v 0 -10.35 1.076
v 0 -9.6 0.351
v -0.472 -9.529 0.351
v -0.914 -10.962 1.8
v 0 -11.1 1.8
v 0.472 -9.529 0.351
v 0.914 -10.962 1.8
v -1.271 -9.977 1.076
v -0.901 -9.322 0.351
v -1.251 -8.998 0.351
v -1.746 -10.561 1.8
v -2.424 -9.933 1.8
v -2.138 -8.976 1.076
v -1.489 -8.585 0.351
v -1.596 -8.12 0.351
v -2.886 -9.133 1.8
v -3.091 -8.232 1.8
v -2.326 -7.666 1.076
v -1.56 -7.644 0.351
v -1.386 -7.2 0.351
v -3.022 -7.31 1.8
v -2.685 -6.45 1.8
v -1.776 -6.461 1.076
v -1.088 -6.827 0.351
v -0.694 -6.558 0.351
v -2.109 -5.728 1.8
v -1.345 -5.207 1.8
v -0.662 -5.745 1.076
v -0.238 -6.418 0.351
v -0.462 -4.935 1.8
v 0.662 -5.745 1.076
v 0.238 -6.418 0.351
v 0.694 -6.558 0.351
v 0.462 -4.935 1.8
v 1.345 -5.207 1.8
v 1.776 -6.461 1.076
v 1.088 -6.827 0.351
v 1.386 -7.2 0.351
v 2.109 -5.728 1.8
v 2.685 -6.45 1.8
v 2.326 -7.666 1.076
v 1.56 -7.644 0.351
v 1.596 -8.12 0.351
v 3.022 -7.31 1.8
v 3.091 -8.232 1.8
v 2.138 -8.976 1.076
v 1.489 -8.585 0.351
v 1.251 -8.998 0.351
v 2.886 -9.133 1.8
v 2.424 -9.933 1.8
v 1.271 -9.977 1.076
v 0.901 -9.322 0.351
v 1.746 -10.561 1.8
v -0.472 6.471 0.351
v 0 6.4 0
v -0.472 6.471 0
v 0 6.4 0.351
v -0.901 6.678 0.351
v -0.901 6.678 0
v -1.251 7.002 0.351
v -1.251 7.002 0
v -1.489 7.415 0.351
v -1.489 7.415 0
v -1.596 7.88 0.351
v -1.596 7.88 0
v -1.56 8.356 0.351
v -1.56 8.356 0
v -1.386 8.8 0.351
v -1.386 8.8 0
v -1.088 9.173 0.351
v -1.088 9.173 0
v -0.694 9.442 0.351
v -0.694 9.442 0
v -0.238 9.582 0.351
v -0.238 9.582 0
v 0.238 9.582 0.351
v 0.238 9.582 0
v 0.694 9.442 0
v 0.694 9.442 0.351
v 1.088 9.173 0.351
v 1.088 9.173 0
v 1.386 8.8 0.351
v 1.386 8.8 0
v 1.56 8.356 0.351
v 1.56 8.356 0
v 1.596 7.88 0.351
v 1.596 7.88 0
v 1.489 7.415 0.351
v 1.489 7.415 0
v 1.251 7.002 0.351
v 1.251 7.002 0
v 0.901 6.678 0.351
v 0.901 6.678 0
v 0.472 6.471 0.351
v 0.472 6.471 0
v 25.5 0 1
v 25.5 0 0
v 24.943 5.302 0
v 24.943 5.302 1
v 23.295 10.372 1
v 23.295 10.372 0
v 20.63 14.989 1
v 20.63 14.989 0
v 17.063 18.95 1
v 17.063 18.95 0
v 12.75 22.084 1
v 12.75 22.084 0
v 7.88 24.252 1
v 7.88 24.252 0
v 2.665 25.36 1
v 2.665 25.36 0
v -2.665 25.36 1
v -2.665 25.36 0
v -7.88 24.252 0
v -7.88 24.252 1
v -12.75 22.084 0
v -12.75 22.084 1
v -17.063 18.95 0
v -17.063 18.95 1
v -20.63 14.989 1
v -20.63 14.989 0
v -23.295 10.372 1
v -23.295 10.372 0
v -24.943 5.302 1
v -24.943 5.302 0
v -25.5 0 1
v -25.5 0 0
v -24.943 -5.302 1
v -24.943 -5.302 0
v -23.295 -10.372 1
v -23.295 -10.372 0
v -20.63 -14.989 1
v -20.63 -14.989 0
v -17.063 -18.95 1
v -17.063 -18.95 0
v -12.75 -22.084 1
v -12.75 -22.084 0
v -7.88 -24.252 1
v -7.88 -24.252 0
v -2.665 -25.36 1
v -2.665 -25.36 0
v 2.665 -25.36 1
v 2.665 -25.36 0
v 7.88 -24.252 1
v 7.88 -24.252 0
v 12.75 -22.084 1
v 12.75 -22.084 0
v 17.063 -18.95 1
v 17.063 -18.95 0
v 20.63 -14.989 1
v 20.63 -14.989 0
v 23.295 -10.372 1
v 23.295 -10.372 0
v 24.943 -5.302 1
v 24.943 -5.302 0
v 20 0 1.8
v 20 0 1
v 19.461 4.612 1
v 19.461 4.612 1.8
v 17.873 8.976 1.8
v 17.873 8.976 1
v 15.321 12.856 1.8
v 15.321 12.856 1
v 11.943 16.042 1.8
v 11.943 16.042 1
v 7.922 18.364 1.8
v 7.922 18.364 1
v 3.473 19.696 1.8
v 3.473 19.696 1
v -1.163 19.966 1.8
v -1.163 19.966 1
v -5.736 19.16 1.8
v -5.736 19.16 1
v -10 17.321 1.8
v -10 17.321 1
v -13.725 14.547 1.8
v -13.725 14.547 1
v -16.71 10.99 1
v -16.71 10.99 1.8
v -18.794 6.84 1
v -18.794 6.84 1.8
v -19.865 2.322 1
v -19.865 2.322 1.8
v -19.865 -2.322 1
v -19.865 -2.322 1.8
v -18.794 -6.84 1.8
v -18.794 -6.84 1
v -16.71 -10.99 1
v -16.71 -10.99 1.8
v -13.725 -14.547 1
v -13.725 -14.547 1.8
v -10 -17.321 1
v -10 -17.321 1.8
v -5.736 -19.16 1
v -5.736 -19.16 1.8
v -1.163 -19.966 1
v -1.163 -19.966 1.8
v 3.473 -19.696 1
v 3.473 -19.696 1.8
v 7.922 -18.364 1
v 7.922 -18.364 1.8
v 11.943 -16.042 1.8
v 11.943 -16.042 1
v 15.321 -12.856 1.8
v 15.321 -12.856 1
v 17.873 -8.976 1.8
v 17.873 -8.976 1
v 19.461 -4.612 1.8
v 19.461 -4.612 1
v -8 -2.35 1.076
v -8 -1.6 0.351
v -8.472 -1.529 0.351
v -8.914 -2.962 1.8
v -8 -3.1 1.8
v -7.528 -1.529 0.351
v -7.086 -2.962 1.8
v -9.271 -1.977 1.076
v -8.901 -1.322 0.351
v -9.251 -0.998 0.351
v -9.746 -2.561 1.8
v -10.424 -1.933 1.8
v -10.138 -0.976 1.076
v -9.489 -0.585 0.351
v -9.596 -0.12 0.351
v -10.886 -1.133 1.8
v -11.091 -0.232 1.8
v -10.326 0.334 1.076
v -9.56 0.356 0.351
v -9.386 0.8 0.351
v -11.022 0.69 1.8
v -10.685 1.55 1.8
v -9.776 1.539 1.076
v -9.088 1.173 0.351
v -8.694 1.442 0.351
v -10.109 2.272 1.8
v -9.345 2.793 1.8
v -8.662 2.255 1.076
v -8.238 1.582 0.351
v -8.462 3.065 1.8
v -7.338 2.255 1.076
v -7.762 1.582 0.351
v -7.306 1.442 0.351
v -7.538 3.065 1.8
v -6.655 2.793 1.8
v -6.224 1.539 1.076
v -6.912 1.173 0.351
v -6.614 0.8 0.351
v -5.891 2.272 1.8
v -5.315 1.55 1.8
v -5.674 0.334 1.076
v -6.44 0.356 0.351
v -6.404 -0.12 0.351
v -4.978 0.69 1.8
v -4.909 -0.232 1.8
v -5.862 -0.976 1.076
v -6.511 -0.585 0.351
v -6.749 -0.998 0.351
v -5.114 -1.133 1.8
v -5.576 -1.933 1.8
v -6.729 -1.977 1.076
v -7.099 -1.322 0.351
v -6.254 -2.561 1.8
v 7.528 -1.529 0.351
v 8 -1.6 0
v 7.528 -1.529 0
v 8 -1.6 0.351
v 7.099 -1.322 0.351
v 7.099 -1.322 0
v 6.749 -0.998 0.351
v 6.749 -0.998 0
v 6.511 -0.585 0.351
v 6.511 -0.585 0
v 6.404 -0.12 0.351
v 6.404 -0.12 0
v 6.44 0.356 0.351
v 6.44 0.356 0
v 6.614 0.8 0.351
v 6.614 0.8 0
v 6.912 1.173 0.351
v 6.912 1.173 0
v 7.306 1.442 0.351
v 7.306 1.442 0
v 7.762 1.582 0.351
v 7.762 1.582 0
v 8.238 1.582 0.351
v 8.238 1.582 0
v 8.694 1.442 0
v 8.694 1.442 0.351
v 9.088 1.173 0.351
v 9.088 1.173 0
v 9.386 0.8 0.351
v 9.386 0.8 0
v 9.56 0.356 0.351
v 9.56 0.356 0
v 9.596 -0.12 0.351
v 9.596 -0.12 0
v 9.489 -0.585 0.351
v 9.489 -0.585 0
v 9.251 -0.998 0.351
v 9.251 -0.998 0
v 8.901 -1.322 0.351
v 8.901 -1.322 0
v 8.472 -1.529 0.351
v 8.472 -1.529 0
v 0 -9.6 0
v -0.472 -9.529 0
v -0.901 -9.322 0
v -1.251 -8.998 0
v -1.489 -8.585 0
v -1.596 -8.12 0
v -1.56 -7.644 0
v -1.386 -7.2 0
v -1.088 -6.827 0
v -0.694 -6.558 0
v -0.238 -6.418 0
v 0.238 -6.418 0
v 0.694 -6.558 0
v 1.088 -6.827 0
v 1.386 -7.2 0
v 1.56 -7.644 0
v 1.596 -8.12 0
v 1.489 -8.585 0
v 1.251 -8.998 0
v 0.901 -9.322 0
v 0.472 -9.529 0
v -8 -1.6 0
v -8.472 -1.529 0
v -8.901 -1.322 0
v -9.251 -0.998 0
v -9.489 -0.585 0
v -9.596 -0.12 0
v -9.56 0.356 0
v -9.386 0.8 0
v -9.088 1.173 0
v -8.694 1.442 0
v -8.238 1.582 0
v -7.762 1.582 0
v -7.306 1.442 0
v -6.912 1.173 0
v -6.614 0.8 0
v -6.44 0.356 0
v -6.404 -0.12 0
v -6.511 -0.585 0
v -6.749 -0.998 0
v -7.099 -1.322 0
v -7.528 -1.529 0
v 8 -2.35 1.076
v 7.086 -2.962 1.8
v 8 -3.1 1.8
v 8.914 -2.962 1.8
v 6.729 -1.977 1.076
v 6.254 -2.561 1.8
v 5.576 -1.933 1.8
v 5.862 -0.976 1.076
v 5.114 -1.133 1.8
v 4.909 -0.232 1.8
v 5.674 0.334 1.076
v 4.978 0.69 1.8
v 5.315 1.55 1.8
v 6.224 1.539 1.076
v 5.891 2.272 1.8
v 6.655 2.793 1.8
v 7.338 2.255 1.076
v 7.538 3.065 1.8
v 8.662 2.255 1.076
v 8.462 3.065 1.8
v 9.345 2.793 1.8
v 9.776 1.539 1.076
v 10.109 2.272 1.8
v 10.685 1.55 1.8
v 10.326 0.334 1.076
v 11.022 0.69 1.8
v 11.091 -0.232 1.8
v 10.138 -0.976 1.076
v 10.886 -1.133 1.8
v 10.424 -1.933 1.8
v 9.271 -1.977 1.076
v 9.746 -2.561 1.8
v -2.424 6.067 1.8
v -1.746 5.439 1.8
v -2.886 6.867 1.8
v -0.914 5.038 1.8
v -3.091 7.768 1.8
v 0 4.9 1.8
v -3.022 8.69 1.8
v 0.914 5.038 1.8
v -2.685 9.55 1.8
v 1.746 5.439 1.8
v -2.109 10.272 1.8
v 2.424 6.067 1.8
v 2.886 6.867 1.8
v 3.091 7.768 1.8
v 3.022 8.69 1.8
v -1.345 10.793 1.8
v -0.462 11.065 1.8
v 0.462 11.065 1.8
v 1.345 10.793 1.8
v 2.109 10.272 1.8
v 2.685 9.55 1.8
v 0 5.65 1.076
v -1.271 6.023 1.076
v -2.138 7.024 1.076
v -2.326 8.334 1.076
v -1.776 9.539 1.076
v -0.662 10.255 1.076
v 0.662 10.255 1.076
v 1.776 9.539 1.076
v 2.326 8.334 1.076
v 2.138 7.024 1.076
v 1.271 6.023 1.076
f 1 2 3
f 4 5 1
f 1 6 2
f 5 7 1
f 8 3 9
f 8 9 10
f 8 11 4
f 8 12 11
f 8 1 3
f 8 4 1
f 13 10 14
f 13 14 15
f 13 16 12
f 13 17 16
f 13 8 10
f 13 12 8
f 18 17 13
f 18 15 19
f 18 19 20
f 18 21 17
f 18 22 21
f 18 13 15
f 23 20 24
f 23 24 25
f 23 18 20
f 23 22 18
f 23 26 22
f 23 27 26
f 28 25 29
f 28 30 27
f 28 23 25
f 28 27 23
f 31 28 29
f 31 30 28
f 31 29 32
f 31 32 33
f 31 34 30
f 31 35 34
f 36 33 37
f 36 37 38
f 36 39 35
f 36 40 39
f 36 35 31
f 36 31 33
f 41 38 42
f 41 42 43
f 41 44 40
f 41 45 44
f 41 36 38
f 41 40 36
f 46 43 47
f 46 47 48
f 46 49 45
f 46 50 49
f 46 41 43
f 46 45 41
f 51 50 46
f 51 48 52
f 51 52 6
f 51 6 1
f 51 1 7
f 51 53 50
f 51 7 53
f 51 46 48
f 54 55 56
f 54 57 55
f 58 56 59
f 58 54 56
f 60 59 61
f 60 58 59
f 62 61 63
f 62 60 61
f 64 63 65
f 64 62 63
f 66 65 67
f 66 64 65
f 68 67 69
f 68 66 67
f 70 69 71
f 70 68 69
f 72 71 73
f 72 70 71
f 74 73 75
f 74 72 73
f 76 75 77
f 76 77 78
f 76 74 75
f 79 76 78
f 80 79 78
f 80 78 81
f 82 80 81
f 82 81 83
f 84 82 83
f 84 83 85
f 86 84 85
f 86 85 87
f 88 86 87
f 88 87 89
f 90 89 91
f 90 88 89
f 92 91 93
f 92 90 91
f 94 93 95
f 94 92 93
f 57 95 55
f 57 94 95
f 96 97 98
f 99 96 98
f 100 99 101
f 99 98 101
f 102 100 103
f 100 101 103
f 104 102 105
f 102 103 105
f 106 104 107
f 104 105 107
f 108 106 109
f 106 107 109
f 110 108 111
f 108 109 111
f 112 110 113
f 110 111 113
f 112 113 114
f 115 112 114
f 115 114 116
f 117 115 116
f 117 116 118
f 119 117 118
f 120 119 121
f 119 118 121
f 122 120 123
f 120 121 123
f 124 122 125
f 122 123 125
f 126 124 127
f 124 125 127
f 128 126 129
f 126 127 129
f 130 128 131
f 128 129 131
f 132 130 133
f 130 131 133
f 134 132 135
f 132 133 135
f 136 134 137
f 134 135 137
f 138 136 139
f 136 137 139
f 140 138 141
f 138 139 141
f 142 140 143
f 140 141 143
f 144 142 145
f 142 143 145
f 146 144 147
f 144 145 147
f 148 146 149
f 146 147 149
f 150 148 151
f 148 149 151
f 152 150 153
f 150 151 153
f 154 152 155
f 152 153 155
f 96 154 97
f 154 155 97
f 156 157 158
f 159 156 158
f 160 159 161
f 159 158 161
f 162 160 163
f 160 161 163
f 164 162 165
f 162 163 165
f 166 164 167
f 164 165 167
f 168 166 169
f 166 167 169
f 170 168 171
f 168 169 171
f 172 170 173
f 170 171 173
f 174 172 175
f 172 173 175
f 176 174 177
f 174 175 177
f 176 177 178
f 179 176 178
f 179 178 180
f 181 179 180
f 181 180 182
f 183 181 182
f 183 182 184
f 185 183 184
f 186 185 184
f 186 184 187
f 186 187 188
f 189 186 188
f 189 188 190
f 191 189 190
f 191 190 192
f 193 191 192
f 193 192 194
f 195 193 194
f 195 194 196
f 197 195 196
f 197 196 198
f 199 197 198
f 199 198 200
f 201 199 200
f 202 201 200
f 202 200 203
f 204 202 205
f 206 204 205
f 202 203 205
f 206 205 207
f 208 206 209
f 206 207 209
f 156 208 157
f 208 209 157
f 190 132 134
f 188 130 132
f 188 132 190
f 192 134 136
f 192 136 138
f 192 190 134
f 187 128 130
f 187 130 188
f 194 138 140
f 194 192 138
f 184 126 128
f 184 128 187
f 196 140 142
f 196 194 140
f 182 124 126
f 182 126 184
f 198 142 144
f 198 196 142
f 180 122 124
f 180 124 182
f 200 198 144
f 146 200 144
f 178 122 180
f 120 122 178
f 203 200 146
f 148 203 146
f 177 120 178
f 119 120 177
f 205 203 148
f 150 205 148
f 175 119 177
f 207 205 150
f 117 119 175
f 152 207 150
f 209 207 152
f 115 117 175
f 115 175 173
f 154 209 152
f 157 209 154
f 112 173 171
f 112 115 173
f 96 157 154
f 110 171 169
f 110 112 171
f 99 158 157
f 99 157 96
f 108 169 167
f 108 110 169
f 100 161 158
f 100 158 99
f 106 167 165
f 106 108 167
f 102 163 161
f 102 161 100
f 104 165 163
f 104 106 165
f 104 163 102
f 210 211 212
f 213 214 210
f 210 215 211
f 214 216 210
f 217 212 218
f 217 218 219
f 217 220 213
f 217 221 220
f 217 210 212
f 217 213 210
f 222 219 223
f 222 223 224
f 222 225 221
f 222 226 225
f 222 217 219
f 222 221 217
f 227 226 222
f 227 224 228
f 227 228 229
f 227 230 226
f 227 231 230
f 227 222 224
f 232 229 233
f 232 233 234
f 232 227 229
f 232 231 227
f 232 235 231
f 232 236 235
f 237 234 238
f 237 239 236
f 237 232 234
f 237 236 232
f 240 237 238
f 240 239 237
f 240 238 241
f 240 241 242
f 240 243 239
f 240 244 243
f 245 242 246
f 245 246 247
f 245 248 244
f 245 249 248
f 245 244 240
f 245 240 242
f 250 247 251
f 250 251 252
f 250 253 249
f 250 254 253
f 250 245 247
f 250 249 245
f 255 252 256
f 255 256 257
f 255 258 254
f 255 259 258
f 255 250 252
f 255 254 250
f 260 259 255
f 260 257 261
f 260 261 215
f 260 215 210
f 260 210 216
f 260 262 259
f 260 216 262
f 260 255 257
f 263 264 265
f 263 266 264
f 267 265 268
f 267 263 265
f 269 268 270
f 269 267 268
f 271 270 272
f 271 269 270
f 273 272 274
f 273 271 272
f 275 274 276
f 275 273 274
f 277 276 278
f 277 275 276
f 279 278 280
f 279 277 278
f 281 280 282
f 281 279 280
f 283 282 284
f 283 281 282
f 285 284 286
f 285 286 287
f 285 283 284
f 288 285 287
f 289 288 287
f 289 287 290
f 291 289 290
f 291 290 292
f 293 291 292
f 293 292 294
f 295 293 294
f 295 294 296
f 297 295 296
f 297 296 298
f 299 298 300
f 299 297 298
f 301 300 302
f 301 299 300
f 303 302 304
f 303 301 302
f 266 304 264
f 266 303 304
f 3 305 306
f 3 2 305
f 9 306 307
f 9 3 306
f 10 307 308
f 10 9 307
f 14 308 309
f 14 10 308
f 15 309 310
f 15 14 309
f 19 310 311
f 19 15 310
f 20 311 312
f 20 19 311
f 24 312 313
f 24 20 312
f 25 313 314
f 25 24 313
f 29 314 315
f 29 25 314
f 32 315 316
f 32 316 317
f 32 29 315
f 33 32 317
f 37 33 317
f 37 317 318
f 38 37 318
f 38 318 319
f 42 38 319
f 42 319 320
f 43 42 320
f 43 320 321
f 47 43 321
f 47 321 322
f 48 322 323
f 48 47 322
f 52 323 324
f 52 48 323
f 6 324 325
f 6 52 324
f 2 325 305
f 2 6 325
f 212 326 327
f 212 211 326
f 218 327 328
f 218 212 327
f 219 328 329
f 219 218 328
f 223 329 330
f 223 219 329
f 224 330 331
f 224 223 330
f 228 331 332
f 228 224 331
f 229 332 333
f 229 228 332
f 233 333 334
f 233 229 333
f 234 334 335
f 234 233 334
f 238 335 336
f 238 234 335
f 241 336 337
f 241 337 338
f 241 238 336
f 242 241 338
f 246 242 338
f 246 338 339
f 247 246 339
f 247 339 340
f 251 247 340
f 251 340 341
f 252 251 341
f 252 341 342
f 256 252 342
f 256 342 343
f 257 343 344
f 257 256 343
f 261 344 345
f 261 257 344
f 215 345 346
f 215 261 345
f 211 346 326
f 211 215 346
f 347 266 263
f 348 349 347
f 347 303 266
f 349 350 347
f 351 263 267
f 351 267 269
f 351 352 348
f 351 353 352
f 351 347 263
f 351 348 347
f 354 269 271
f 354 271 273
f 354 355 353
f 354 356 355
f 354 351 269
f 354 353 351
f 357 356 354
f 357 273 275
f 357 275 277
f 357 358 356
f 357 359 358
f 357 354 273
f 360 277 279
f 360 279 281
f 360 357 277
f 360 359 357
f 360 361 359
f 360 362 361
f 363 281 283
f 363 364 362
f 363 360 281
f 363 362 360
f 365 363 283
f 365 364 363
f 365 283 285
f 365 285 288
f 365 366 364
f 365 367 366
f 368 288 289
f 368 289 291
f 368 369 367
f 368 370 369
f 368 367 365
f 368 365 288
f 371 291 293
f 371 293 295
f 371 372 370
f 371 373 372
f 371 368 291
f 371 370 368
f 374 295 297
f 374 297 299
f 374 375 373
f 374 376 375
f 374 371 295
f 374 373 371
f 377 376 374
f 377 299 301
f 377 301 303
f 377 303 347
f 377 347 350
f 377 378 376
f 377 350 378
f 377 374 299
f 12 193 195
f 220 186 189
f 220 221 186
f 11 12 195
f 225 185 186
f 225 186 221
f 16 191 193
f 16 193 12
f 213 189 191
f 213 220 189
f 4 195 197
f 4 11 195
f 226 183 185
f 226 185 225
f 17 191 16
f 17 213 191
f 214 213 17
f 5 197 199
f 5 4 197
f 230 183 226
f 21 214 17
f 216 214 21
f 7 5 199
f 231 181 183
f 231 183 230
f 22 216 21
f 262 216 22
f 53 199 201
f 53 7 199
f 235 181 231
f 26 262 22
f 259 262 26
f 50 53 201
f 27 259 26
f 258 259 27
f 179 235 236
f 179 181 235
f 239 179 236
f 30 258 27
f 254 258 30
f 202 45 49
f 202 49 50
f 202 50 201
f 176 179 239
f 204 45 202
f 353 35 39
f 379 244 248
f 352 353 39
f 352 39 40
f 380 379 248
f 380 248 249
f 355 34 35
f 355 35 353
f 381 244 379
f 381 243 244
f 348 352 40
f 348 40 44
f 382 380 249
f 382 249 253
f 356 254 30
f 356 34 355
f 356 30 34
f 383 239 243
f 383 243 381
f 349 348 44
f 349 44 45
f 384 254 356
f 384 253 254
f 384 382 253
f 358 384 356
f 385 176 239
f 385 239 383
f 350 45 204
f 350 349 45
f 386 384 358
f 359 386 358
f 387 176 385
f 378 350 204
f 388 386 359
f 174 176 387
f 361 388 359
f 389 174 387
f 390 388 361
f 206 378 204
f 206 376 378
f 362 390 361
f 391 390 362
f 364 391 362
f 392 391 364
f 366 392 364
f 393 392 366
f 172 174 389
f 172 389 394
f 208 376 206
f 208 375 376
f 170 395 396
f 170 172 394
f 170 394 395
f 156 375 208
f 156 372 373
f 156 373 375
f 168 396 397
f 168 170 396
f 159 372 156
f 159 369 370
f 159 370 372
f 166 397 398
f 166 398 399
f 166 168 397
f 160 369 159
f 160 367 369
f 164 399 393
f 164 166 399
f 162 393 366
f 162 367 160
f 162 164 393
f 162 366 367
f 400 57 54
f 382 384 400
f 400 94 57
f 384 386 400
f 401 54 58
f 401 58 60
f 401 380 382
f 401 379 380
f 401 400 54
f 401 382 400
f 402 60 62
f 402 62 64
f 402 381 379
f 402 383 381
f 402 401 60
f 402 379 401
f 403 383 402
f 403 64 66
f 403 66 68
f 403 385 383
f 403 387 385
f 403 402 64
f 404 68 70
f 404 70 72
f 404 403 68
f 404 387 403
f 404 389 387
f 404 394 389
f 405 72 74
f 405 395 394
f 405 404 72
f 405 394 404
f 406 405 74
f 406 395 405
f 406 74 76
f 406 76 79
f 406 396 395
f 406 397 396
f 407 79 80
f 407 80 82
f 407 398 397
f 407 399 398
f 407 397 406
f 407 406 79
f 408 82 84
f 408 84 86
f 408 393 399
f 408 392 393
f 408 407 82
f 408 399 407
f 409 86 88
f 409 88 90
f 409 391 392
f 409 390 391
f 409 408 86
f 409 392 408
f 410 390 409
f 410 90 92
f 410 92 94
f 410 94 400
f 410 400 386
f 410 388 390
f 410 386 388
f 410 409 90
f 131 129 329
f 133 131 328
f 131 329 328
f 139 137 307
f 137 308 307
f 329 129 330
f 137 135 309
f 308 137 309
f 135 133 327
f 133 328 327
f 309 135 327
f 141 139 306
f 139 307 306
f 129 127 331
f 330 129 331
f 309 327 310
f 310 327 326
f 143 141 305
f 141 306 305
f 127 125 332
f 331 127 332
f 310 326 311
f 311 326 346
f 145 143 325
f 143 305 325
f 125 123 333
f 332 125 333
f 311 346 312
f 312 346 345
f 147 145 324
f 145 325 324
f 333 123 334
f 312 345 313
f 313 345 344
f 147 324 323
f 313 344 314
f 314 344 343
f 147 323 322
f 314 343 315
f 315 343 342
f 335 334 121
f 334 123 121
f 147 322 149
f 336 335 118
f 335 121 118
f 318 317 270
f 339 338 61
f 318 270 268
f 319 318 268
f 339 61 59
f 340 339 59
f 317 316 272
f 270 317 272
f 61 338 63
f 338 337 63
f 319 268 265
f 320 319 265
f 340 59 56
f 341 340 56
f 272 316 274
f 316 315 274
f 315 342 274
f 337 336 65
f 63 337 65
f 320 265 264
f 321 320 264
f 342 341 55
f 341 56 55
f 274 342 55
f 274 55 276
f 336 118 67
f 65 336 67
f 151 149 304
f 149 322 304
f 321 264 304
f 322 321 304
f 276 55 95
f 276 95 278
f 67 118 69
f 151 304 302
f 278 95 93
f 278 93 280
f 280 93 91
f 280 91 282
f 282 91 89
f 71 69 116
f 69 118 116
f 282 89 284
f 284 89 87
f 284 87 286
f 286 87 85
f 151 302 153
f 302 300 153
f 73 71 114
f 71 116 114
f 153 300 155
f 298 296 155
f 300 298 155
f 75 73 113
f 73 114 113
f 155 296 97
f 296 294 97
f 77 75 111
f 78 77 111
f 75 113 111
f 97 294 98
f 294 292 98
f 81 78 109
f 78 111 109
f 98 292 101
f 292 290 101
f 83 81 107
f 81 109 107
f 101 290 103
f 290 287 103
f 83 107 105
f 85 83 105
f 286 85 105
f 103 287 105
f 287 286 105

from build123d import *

# Parameters (mm, degrees)
SKETCH1_R           = 25.5
SKETCH1_R_2         = 20
BOSS_EXTRUDE1_DEPTH = 1
SKETCH1_3_R         = 20
BOSS_EXTRUDE2_DEPTH = 1.8
HOLE1_AT_2_COUNT    = 2
HOLE1_AT_2_PITCH    = 11.313708499
HOLE1_AT_3_COUNT    = 2
HOLE1_AT_3_PITCH    = 16
HOLE1_AT_4_COUNT    = 2
HOLE1_AT_4_PITCH    = 11.313708499


with BuildPart() as part:
    # Sketch1 → Boss-Extrude1 (new body)
    with BuildSketch(Plane.XY):
        Circle(SKETCH1_R)
        Circle(SKETCH1_R_2, mode=Mode.SUBTRACT)
    extrude(amount=BOSS_EXTRUDE1_DEPTH)

    # Sketch1<3> → Boss-Extrude2 (add)
    with BuildSketch(Plane.XY):
        Circle(SKETCH1_3_R)
    extrude(amount=BOSS_EXTRUDE2_DEPTH)

    # Sketch4 → Hole1 (revolve, cut)
    with BuildSketch(Plane(origin=(-8, 0, 1.8), x_dir=(0, -1, 0), z_dir=(1, 0, 0))):
        Polygon((0, 0), (0, 1.8), (1.6, 1.8), (1.6, 1.448533162), (3.1, 0), align=None)
    hole1 = revolve(axis=Axis((-8, 0, 8.245314094), (0, 0, -1)), mode=Mode.SUBTRACT)

    # Hole1 at 2: Hole1 ×2
    with Locations(*[Vector(0.7071067811865276, 0.7071067811865676, 0) * (i * HOLE1_AT_2_PITCH) for i in range(1, HOLE1_AT_2_COUNT)]):
        add(hole1, mode=Mode.SUBTRACT)

    # Hole1 at 3: Hole1 ×2
    with Locations(*[(i * HOLE1_AT_3_PITCH, 0, 0) for i in range(1, HOLE1_AT_3_COUNT)]):
        add(hole1, mode=Mode.SUBTRACT)

    # Hole1 at 4: Hole1 ×2
    with Locations(*[Vector(0.7071067811865676, -0.7071067811865276, 0) * (i * HOLE1_AT_4_PITCH) for i in range(1, HOLE1_AT_4_COUNT)]):
        add(hole1, mode=Mode.SUBTRACT)


solid = part.part
